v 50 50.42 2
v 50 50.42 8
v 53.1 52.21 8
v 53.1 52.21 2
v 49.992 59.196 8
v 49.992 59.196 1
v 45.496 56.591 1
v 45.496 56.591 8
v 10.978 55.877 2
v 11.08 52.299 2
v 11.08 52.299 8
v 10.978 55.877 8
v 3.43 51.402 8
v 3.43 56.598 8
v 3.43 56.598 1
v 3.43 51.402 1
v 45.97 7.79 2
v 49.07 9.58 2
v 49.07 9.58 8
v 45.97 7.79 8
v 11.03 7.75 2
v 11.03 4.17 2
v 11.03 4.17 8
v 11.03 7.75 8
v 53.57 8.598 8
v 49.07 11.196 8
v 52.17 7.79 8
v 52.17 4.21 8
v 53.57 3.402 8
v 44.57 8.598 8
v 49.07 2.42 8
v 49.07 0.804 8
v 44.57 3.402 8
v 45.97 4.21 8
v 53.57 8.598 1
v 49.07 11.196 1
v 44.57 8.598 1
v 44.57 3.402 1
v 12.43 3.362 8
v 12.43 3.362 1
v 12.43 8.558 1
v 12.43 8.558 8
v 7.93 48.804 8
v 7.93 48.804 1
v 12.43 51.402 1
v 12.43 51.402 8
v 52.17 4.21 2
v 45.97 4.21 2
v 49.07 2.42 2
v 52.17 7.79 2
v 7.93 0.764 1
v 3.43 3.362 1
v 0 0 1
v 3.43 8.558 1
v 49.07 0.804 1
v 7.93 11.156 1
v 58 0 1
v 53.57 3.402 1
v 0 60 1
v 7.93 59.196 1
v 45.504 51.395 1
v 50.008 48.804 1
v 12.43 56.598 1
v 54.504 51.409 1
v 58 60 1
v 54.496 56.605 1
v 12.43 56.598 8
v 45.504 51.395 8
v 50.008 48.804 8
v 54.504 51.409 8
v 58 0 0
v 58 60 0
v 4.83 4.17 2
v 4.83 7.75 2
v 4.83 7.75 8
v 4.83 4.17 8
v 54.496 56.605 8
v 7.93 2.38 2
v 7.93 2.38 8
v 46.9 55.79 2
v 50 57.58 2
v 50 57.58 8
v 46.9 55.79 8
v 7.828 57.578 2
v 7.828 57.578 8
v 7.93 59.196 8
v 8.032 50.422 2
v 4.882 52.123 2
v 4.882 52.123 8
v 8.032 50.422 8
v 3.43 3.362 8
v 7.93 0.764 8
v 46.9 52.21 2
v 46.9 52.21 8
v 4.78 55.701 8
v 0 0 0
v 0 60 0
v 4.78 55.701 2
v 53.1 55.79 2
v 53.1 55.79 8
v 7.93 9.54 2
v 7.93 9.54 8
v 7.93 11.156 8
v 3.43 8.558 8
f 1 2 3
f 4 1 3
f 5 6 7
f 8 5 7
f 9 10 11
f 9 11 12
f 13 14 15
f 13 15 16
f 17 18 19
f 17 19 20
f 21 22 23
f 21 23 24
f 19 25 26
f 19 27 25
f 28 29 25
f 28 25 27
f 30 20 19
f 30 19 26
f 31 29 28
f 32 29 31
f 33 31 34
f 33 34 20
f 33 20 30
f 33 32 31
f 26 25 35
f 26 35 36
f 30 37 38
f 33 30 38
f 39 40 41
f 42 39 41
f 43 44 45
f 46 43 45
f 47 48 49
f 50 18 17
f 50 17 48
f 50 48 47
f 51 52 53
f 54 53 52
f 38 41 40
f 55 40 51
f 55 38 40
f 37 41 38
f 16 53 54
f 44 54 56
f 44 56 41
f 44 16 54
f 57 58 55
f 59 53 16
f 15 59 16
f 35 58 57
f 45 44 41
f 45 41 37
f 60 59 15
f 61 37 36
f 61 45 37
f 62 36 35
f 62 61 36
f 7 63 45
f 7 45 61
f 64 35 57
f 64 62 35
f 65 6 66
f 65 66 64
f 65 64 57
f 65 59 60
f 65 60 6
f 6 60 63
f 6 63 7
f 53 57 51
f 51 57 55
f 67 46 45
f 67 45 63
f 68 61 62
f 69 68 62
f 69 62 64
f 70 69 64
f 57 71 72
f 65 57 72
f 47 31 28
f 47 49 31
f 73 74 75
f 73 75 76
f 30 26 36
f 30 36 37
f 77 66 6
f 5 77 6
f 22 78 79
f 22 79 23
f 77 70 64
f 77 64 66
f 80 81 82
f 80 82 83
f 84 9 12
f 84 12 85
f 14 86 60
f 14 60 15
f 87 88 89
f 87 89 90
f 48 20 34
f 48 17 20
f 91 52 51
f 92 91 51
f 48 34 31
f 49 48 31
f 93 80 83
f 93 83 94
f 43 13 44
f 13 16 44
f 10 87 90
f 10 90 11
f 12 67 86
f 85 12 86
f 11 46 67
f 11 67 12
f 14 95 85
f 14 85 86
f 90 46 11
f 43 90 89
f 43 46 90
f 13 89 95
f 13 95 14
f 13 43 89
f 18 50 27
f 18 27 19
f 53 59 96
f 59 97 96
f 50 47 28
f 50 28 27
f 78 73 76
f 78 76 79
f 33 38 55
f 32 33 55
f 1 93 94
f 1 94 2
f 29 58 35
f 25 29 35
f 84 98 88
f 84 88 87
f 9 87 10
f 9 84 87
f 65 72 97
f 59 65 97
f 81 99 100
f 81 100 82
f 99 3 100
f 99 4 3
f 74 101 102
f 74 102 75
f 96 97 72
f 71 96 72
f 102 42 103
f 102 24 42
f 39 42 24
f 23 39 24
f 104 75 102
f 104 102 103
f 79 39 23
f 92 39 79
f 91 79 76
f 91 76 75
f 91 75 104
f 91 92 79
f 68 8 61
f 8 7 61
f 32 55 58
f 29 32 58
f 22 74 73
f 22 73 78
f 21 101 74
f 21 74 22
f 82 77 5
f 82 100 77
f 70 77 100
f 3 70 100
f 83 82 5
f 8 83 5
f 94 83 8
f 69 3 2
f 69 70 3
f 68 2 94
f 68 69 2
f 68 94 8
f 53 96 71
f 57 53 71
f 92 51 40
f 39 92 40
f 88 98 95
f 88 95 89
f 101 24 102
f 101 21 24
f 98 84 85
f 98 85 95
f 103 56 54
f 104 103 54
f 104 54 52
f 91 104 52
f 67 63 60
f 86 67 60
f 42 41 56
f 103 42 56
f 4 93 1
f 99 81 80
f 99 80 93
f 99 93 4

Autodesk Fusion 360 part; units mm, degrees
sketch "Sketch1" plane through (0, 0, 0) normal (0, 0, 1) x (1, 0, 0)
  line L0 (0, 0) -> (67, 0)
  line L1 (67, 0) -> (67, 60)
  line L2 (67, 60) -> (0, 60)
  line L3 (0, 60) -> (0, 0)
  dimension "d1" = 67
  dimension "d2" = 60
extrude "Extrude1" add sketch "Sketch1" along normal blind 1 makes body 1
sketch "Sketch2" plane through (0, 0, 1) normal (0, 0, 1) x (-1, 0, 0)
  line L0 (0, -60) -> (0, 0)
  line L1 (0, 0) -> (-67, 0)
  line L2 (-67, 0) -> (-67, -60)
  line L3 (-67, -60) -> (0, -60)
  line L4 (-57, -60) -> (-57, 0)
  line L5 (-10.9779, -55.8771) -> (-7.8284, -57.5781)
  line L6 (-7.8284, -57.5781) -> (-4.7804, -55.701)
  line L7 (-4.7804, -55.701) -> (-4.8821, -52.1229)
  line L8 (-4.8821, -52.1229) -> (-8.0316, -50.4219)
  line L9 (-8.0316, -50.4219) -> (-11.0796, -52.299)
  line L10 (-11.0796, -52.299) -> (-10.9779, -55.8771)
  line L11 (-12.43, -56.5981) -> (-7.93, -59.1962)
  line L12 (-7.93, -59.1962) -> (-3.43, -56.5981)
  line L13 (-3.43, -56.5981) -> (-3.43, -51.4019)
  line L14 (-3.43, -51.4019) -> (-7.93, -48.8038)
  line L15 (-7.93, -48.8038) -> (-12.43, -51.4019)
  line L16 (-12.43, -51.4019) -> (-12.43, -56.5981)
  line L17 (-53.1, -55.7898) -> (-50, -57.5796)
  line L18 (-50, -57.5796) -> (-46.9, -55.7898)
  line L19 (-46.9, -55.7898) -> (-46.9, -52.2102)
  line L20 (-46.9, -52.2102) -> (-50, -50.4204)
  line L21 (-50, -50.4204) -> (-53.1, -52.2102)
  line L22 (-53.1, -52.2102) -> (-53.1, -55.7898)
  line L23 (-54.4959, -56.6052) -> (-49.9918, -59.1961)
  line L24 (-49.9918, -59.1961) -> (-45.4959, -56.5909)
  line L25 (-45.4959, -56.5909) -> (-45.5041, -51.3948)
  line L26 (-45.5041, -51.3948) -> (-50.0082, -48.8039)
  line L27 (-50.0082, -48.8039) -> (-54.5041, -51.4091)
  line L28 (-54.5041, -51.4091) -> (-54.4959, -56.6052)
  line L29 (-11.03, -7.7498) -> (-7.93, -9.5396)
  line L30 (-7.93, -9.5396) -> (-4.83, -7.7498)
  line L31 (-4.83, -7.7498) -> (-4.83, -4.1702)
  line L32 (-4.83, -4.1702) -> (-7.93, -2.3804)
  line L33 (-7.93, -2.3804) -> (-11.03, -4.1702)
  line L34 (-11.03, -4.1702) -> (-11.03, -7.7498)
  line L35 (-12.43, -8.5581) -> (-7.93, -11.1562)
  line L36 (-7.93, -11.1562) -> (-3.43, -8.5581)
  line L37 (-3.43, -8.5581) -> (-3.43, -3.3619)
  line L38 (-3.43, -3.3619) -> (-7.93, -0.7638)
  line L39 (-7.93, -0.7638) -> (-12.43, -3.3619)
  line L40 (-12.43, -3.3619) -> (-12.43, -8.5581)
  line L41 (-52.17, -7.7898) -> (-49.07, -9.5796)
  line L42 (-49.07, -9.5796) -> (-45.97, -7.7898)
  line L43 (-45.97, -7.7898) -> (-45.97, -4.2102)
  line L44 (-45.97, -4.2102) -> (-49.07, -2.4204)
  line L45 (-49.07, -2.4204) -> (-52.17, -4.2102)
  line L46 (-52.17, -4.2102) -> (-52.17, -7.7898)
  line L47 (-53.57, -8.5981) -> (-49.07, -11.1962)
  line L48 (-49.07, -11.1962) -> (-44.57, -8.5981)
  line L49 (-44.57, -8.5981) -> (-44.57, -3.4019)
  line L50 (-44.57, -3.4019) -> (-49.07, -0.8038)
  line L51 (-49.07, -0.8038) -> (-53.57, -3.4019)
  line L52 (-53.57, -3.4019) -> (-53.57, -8.5981)
  point P0 (-7.93, -5.96)
  point P1 (-7.93, -54)
  point P2 (-50, -54)
  point P3 (-49.07, -6)
  point P4 (-7.93, -54)
  point P5 (-7.93, -54)
  point P6 (-50, -54)
  point P7 (-50, -54)
  point P8 (-7.93, -5.96)
  point P9 (-7.93, -5.96)
  point P10 (-49.07, -6)
  point P11 (-49.07, -6)
  dimension "d5" = 48.04
  dimension "d7" = 42.07
  dimension "d8" = 7
  dimension "d9" = 6
  dimension "d10" = 3.1
  dimension "d11" = 4.5
  dimension "d12" = 3.1
  dimension "d13" = 4.5
  dimension "d14" = 3.1
  dimension "d15" = 4.5
  dimension "d16" = 3.1
  dimension "d17" = 4.5
extrude "Extrude2" add sketch "Sketch2" along normal blind 7 contours L11 L12 L13 L14 L15 L16 | L23 L24 L25 L26 L27 L28 | L35 L36 L37 L38 L39 L40 | L47 L48 L49 L50 L51 L52 bodies 1
extrude "Extrude3" cut 1 faces at (67, 20, 0.3333) along direction (-1, 0, 0) blind 9 on bodies 1 bodies 1
extrude "Extrude4" add 4 faces at (8.9799, 53.433, 1) (51.0333, 53.4034, 1) (48.0367, 5.4034, 1) (8.9633, 6.5566, 1) along direction (0, 0, 1) blind 1 on bodies 1 bodies 1
copy_body "Body->Comp1" bodies 1 removing the originals makes body 2 in component "Component"
component "Component" placed x (1, 0, 0) y (0, 1, 0) z (0, 0, 1) at (0, 0, 0)
